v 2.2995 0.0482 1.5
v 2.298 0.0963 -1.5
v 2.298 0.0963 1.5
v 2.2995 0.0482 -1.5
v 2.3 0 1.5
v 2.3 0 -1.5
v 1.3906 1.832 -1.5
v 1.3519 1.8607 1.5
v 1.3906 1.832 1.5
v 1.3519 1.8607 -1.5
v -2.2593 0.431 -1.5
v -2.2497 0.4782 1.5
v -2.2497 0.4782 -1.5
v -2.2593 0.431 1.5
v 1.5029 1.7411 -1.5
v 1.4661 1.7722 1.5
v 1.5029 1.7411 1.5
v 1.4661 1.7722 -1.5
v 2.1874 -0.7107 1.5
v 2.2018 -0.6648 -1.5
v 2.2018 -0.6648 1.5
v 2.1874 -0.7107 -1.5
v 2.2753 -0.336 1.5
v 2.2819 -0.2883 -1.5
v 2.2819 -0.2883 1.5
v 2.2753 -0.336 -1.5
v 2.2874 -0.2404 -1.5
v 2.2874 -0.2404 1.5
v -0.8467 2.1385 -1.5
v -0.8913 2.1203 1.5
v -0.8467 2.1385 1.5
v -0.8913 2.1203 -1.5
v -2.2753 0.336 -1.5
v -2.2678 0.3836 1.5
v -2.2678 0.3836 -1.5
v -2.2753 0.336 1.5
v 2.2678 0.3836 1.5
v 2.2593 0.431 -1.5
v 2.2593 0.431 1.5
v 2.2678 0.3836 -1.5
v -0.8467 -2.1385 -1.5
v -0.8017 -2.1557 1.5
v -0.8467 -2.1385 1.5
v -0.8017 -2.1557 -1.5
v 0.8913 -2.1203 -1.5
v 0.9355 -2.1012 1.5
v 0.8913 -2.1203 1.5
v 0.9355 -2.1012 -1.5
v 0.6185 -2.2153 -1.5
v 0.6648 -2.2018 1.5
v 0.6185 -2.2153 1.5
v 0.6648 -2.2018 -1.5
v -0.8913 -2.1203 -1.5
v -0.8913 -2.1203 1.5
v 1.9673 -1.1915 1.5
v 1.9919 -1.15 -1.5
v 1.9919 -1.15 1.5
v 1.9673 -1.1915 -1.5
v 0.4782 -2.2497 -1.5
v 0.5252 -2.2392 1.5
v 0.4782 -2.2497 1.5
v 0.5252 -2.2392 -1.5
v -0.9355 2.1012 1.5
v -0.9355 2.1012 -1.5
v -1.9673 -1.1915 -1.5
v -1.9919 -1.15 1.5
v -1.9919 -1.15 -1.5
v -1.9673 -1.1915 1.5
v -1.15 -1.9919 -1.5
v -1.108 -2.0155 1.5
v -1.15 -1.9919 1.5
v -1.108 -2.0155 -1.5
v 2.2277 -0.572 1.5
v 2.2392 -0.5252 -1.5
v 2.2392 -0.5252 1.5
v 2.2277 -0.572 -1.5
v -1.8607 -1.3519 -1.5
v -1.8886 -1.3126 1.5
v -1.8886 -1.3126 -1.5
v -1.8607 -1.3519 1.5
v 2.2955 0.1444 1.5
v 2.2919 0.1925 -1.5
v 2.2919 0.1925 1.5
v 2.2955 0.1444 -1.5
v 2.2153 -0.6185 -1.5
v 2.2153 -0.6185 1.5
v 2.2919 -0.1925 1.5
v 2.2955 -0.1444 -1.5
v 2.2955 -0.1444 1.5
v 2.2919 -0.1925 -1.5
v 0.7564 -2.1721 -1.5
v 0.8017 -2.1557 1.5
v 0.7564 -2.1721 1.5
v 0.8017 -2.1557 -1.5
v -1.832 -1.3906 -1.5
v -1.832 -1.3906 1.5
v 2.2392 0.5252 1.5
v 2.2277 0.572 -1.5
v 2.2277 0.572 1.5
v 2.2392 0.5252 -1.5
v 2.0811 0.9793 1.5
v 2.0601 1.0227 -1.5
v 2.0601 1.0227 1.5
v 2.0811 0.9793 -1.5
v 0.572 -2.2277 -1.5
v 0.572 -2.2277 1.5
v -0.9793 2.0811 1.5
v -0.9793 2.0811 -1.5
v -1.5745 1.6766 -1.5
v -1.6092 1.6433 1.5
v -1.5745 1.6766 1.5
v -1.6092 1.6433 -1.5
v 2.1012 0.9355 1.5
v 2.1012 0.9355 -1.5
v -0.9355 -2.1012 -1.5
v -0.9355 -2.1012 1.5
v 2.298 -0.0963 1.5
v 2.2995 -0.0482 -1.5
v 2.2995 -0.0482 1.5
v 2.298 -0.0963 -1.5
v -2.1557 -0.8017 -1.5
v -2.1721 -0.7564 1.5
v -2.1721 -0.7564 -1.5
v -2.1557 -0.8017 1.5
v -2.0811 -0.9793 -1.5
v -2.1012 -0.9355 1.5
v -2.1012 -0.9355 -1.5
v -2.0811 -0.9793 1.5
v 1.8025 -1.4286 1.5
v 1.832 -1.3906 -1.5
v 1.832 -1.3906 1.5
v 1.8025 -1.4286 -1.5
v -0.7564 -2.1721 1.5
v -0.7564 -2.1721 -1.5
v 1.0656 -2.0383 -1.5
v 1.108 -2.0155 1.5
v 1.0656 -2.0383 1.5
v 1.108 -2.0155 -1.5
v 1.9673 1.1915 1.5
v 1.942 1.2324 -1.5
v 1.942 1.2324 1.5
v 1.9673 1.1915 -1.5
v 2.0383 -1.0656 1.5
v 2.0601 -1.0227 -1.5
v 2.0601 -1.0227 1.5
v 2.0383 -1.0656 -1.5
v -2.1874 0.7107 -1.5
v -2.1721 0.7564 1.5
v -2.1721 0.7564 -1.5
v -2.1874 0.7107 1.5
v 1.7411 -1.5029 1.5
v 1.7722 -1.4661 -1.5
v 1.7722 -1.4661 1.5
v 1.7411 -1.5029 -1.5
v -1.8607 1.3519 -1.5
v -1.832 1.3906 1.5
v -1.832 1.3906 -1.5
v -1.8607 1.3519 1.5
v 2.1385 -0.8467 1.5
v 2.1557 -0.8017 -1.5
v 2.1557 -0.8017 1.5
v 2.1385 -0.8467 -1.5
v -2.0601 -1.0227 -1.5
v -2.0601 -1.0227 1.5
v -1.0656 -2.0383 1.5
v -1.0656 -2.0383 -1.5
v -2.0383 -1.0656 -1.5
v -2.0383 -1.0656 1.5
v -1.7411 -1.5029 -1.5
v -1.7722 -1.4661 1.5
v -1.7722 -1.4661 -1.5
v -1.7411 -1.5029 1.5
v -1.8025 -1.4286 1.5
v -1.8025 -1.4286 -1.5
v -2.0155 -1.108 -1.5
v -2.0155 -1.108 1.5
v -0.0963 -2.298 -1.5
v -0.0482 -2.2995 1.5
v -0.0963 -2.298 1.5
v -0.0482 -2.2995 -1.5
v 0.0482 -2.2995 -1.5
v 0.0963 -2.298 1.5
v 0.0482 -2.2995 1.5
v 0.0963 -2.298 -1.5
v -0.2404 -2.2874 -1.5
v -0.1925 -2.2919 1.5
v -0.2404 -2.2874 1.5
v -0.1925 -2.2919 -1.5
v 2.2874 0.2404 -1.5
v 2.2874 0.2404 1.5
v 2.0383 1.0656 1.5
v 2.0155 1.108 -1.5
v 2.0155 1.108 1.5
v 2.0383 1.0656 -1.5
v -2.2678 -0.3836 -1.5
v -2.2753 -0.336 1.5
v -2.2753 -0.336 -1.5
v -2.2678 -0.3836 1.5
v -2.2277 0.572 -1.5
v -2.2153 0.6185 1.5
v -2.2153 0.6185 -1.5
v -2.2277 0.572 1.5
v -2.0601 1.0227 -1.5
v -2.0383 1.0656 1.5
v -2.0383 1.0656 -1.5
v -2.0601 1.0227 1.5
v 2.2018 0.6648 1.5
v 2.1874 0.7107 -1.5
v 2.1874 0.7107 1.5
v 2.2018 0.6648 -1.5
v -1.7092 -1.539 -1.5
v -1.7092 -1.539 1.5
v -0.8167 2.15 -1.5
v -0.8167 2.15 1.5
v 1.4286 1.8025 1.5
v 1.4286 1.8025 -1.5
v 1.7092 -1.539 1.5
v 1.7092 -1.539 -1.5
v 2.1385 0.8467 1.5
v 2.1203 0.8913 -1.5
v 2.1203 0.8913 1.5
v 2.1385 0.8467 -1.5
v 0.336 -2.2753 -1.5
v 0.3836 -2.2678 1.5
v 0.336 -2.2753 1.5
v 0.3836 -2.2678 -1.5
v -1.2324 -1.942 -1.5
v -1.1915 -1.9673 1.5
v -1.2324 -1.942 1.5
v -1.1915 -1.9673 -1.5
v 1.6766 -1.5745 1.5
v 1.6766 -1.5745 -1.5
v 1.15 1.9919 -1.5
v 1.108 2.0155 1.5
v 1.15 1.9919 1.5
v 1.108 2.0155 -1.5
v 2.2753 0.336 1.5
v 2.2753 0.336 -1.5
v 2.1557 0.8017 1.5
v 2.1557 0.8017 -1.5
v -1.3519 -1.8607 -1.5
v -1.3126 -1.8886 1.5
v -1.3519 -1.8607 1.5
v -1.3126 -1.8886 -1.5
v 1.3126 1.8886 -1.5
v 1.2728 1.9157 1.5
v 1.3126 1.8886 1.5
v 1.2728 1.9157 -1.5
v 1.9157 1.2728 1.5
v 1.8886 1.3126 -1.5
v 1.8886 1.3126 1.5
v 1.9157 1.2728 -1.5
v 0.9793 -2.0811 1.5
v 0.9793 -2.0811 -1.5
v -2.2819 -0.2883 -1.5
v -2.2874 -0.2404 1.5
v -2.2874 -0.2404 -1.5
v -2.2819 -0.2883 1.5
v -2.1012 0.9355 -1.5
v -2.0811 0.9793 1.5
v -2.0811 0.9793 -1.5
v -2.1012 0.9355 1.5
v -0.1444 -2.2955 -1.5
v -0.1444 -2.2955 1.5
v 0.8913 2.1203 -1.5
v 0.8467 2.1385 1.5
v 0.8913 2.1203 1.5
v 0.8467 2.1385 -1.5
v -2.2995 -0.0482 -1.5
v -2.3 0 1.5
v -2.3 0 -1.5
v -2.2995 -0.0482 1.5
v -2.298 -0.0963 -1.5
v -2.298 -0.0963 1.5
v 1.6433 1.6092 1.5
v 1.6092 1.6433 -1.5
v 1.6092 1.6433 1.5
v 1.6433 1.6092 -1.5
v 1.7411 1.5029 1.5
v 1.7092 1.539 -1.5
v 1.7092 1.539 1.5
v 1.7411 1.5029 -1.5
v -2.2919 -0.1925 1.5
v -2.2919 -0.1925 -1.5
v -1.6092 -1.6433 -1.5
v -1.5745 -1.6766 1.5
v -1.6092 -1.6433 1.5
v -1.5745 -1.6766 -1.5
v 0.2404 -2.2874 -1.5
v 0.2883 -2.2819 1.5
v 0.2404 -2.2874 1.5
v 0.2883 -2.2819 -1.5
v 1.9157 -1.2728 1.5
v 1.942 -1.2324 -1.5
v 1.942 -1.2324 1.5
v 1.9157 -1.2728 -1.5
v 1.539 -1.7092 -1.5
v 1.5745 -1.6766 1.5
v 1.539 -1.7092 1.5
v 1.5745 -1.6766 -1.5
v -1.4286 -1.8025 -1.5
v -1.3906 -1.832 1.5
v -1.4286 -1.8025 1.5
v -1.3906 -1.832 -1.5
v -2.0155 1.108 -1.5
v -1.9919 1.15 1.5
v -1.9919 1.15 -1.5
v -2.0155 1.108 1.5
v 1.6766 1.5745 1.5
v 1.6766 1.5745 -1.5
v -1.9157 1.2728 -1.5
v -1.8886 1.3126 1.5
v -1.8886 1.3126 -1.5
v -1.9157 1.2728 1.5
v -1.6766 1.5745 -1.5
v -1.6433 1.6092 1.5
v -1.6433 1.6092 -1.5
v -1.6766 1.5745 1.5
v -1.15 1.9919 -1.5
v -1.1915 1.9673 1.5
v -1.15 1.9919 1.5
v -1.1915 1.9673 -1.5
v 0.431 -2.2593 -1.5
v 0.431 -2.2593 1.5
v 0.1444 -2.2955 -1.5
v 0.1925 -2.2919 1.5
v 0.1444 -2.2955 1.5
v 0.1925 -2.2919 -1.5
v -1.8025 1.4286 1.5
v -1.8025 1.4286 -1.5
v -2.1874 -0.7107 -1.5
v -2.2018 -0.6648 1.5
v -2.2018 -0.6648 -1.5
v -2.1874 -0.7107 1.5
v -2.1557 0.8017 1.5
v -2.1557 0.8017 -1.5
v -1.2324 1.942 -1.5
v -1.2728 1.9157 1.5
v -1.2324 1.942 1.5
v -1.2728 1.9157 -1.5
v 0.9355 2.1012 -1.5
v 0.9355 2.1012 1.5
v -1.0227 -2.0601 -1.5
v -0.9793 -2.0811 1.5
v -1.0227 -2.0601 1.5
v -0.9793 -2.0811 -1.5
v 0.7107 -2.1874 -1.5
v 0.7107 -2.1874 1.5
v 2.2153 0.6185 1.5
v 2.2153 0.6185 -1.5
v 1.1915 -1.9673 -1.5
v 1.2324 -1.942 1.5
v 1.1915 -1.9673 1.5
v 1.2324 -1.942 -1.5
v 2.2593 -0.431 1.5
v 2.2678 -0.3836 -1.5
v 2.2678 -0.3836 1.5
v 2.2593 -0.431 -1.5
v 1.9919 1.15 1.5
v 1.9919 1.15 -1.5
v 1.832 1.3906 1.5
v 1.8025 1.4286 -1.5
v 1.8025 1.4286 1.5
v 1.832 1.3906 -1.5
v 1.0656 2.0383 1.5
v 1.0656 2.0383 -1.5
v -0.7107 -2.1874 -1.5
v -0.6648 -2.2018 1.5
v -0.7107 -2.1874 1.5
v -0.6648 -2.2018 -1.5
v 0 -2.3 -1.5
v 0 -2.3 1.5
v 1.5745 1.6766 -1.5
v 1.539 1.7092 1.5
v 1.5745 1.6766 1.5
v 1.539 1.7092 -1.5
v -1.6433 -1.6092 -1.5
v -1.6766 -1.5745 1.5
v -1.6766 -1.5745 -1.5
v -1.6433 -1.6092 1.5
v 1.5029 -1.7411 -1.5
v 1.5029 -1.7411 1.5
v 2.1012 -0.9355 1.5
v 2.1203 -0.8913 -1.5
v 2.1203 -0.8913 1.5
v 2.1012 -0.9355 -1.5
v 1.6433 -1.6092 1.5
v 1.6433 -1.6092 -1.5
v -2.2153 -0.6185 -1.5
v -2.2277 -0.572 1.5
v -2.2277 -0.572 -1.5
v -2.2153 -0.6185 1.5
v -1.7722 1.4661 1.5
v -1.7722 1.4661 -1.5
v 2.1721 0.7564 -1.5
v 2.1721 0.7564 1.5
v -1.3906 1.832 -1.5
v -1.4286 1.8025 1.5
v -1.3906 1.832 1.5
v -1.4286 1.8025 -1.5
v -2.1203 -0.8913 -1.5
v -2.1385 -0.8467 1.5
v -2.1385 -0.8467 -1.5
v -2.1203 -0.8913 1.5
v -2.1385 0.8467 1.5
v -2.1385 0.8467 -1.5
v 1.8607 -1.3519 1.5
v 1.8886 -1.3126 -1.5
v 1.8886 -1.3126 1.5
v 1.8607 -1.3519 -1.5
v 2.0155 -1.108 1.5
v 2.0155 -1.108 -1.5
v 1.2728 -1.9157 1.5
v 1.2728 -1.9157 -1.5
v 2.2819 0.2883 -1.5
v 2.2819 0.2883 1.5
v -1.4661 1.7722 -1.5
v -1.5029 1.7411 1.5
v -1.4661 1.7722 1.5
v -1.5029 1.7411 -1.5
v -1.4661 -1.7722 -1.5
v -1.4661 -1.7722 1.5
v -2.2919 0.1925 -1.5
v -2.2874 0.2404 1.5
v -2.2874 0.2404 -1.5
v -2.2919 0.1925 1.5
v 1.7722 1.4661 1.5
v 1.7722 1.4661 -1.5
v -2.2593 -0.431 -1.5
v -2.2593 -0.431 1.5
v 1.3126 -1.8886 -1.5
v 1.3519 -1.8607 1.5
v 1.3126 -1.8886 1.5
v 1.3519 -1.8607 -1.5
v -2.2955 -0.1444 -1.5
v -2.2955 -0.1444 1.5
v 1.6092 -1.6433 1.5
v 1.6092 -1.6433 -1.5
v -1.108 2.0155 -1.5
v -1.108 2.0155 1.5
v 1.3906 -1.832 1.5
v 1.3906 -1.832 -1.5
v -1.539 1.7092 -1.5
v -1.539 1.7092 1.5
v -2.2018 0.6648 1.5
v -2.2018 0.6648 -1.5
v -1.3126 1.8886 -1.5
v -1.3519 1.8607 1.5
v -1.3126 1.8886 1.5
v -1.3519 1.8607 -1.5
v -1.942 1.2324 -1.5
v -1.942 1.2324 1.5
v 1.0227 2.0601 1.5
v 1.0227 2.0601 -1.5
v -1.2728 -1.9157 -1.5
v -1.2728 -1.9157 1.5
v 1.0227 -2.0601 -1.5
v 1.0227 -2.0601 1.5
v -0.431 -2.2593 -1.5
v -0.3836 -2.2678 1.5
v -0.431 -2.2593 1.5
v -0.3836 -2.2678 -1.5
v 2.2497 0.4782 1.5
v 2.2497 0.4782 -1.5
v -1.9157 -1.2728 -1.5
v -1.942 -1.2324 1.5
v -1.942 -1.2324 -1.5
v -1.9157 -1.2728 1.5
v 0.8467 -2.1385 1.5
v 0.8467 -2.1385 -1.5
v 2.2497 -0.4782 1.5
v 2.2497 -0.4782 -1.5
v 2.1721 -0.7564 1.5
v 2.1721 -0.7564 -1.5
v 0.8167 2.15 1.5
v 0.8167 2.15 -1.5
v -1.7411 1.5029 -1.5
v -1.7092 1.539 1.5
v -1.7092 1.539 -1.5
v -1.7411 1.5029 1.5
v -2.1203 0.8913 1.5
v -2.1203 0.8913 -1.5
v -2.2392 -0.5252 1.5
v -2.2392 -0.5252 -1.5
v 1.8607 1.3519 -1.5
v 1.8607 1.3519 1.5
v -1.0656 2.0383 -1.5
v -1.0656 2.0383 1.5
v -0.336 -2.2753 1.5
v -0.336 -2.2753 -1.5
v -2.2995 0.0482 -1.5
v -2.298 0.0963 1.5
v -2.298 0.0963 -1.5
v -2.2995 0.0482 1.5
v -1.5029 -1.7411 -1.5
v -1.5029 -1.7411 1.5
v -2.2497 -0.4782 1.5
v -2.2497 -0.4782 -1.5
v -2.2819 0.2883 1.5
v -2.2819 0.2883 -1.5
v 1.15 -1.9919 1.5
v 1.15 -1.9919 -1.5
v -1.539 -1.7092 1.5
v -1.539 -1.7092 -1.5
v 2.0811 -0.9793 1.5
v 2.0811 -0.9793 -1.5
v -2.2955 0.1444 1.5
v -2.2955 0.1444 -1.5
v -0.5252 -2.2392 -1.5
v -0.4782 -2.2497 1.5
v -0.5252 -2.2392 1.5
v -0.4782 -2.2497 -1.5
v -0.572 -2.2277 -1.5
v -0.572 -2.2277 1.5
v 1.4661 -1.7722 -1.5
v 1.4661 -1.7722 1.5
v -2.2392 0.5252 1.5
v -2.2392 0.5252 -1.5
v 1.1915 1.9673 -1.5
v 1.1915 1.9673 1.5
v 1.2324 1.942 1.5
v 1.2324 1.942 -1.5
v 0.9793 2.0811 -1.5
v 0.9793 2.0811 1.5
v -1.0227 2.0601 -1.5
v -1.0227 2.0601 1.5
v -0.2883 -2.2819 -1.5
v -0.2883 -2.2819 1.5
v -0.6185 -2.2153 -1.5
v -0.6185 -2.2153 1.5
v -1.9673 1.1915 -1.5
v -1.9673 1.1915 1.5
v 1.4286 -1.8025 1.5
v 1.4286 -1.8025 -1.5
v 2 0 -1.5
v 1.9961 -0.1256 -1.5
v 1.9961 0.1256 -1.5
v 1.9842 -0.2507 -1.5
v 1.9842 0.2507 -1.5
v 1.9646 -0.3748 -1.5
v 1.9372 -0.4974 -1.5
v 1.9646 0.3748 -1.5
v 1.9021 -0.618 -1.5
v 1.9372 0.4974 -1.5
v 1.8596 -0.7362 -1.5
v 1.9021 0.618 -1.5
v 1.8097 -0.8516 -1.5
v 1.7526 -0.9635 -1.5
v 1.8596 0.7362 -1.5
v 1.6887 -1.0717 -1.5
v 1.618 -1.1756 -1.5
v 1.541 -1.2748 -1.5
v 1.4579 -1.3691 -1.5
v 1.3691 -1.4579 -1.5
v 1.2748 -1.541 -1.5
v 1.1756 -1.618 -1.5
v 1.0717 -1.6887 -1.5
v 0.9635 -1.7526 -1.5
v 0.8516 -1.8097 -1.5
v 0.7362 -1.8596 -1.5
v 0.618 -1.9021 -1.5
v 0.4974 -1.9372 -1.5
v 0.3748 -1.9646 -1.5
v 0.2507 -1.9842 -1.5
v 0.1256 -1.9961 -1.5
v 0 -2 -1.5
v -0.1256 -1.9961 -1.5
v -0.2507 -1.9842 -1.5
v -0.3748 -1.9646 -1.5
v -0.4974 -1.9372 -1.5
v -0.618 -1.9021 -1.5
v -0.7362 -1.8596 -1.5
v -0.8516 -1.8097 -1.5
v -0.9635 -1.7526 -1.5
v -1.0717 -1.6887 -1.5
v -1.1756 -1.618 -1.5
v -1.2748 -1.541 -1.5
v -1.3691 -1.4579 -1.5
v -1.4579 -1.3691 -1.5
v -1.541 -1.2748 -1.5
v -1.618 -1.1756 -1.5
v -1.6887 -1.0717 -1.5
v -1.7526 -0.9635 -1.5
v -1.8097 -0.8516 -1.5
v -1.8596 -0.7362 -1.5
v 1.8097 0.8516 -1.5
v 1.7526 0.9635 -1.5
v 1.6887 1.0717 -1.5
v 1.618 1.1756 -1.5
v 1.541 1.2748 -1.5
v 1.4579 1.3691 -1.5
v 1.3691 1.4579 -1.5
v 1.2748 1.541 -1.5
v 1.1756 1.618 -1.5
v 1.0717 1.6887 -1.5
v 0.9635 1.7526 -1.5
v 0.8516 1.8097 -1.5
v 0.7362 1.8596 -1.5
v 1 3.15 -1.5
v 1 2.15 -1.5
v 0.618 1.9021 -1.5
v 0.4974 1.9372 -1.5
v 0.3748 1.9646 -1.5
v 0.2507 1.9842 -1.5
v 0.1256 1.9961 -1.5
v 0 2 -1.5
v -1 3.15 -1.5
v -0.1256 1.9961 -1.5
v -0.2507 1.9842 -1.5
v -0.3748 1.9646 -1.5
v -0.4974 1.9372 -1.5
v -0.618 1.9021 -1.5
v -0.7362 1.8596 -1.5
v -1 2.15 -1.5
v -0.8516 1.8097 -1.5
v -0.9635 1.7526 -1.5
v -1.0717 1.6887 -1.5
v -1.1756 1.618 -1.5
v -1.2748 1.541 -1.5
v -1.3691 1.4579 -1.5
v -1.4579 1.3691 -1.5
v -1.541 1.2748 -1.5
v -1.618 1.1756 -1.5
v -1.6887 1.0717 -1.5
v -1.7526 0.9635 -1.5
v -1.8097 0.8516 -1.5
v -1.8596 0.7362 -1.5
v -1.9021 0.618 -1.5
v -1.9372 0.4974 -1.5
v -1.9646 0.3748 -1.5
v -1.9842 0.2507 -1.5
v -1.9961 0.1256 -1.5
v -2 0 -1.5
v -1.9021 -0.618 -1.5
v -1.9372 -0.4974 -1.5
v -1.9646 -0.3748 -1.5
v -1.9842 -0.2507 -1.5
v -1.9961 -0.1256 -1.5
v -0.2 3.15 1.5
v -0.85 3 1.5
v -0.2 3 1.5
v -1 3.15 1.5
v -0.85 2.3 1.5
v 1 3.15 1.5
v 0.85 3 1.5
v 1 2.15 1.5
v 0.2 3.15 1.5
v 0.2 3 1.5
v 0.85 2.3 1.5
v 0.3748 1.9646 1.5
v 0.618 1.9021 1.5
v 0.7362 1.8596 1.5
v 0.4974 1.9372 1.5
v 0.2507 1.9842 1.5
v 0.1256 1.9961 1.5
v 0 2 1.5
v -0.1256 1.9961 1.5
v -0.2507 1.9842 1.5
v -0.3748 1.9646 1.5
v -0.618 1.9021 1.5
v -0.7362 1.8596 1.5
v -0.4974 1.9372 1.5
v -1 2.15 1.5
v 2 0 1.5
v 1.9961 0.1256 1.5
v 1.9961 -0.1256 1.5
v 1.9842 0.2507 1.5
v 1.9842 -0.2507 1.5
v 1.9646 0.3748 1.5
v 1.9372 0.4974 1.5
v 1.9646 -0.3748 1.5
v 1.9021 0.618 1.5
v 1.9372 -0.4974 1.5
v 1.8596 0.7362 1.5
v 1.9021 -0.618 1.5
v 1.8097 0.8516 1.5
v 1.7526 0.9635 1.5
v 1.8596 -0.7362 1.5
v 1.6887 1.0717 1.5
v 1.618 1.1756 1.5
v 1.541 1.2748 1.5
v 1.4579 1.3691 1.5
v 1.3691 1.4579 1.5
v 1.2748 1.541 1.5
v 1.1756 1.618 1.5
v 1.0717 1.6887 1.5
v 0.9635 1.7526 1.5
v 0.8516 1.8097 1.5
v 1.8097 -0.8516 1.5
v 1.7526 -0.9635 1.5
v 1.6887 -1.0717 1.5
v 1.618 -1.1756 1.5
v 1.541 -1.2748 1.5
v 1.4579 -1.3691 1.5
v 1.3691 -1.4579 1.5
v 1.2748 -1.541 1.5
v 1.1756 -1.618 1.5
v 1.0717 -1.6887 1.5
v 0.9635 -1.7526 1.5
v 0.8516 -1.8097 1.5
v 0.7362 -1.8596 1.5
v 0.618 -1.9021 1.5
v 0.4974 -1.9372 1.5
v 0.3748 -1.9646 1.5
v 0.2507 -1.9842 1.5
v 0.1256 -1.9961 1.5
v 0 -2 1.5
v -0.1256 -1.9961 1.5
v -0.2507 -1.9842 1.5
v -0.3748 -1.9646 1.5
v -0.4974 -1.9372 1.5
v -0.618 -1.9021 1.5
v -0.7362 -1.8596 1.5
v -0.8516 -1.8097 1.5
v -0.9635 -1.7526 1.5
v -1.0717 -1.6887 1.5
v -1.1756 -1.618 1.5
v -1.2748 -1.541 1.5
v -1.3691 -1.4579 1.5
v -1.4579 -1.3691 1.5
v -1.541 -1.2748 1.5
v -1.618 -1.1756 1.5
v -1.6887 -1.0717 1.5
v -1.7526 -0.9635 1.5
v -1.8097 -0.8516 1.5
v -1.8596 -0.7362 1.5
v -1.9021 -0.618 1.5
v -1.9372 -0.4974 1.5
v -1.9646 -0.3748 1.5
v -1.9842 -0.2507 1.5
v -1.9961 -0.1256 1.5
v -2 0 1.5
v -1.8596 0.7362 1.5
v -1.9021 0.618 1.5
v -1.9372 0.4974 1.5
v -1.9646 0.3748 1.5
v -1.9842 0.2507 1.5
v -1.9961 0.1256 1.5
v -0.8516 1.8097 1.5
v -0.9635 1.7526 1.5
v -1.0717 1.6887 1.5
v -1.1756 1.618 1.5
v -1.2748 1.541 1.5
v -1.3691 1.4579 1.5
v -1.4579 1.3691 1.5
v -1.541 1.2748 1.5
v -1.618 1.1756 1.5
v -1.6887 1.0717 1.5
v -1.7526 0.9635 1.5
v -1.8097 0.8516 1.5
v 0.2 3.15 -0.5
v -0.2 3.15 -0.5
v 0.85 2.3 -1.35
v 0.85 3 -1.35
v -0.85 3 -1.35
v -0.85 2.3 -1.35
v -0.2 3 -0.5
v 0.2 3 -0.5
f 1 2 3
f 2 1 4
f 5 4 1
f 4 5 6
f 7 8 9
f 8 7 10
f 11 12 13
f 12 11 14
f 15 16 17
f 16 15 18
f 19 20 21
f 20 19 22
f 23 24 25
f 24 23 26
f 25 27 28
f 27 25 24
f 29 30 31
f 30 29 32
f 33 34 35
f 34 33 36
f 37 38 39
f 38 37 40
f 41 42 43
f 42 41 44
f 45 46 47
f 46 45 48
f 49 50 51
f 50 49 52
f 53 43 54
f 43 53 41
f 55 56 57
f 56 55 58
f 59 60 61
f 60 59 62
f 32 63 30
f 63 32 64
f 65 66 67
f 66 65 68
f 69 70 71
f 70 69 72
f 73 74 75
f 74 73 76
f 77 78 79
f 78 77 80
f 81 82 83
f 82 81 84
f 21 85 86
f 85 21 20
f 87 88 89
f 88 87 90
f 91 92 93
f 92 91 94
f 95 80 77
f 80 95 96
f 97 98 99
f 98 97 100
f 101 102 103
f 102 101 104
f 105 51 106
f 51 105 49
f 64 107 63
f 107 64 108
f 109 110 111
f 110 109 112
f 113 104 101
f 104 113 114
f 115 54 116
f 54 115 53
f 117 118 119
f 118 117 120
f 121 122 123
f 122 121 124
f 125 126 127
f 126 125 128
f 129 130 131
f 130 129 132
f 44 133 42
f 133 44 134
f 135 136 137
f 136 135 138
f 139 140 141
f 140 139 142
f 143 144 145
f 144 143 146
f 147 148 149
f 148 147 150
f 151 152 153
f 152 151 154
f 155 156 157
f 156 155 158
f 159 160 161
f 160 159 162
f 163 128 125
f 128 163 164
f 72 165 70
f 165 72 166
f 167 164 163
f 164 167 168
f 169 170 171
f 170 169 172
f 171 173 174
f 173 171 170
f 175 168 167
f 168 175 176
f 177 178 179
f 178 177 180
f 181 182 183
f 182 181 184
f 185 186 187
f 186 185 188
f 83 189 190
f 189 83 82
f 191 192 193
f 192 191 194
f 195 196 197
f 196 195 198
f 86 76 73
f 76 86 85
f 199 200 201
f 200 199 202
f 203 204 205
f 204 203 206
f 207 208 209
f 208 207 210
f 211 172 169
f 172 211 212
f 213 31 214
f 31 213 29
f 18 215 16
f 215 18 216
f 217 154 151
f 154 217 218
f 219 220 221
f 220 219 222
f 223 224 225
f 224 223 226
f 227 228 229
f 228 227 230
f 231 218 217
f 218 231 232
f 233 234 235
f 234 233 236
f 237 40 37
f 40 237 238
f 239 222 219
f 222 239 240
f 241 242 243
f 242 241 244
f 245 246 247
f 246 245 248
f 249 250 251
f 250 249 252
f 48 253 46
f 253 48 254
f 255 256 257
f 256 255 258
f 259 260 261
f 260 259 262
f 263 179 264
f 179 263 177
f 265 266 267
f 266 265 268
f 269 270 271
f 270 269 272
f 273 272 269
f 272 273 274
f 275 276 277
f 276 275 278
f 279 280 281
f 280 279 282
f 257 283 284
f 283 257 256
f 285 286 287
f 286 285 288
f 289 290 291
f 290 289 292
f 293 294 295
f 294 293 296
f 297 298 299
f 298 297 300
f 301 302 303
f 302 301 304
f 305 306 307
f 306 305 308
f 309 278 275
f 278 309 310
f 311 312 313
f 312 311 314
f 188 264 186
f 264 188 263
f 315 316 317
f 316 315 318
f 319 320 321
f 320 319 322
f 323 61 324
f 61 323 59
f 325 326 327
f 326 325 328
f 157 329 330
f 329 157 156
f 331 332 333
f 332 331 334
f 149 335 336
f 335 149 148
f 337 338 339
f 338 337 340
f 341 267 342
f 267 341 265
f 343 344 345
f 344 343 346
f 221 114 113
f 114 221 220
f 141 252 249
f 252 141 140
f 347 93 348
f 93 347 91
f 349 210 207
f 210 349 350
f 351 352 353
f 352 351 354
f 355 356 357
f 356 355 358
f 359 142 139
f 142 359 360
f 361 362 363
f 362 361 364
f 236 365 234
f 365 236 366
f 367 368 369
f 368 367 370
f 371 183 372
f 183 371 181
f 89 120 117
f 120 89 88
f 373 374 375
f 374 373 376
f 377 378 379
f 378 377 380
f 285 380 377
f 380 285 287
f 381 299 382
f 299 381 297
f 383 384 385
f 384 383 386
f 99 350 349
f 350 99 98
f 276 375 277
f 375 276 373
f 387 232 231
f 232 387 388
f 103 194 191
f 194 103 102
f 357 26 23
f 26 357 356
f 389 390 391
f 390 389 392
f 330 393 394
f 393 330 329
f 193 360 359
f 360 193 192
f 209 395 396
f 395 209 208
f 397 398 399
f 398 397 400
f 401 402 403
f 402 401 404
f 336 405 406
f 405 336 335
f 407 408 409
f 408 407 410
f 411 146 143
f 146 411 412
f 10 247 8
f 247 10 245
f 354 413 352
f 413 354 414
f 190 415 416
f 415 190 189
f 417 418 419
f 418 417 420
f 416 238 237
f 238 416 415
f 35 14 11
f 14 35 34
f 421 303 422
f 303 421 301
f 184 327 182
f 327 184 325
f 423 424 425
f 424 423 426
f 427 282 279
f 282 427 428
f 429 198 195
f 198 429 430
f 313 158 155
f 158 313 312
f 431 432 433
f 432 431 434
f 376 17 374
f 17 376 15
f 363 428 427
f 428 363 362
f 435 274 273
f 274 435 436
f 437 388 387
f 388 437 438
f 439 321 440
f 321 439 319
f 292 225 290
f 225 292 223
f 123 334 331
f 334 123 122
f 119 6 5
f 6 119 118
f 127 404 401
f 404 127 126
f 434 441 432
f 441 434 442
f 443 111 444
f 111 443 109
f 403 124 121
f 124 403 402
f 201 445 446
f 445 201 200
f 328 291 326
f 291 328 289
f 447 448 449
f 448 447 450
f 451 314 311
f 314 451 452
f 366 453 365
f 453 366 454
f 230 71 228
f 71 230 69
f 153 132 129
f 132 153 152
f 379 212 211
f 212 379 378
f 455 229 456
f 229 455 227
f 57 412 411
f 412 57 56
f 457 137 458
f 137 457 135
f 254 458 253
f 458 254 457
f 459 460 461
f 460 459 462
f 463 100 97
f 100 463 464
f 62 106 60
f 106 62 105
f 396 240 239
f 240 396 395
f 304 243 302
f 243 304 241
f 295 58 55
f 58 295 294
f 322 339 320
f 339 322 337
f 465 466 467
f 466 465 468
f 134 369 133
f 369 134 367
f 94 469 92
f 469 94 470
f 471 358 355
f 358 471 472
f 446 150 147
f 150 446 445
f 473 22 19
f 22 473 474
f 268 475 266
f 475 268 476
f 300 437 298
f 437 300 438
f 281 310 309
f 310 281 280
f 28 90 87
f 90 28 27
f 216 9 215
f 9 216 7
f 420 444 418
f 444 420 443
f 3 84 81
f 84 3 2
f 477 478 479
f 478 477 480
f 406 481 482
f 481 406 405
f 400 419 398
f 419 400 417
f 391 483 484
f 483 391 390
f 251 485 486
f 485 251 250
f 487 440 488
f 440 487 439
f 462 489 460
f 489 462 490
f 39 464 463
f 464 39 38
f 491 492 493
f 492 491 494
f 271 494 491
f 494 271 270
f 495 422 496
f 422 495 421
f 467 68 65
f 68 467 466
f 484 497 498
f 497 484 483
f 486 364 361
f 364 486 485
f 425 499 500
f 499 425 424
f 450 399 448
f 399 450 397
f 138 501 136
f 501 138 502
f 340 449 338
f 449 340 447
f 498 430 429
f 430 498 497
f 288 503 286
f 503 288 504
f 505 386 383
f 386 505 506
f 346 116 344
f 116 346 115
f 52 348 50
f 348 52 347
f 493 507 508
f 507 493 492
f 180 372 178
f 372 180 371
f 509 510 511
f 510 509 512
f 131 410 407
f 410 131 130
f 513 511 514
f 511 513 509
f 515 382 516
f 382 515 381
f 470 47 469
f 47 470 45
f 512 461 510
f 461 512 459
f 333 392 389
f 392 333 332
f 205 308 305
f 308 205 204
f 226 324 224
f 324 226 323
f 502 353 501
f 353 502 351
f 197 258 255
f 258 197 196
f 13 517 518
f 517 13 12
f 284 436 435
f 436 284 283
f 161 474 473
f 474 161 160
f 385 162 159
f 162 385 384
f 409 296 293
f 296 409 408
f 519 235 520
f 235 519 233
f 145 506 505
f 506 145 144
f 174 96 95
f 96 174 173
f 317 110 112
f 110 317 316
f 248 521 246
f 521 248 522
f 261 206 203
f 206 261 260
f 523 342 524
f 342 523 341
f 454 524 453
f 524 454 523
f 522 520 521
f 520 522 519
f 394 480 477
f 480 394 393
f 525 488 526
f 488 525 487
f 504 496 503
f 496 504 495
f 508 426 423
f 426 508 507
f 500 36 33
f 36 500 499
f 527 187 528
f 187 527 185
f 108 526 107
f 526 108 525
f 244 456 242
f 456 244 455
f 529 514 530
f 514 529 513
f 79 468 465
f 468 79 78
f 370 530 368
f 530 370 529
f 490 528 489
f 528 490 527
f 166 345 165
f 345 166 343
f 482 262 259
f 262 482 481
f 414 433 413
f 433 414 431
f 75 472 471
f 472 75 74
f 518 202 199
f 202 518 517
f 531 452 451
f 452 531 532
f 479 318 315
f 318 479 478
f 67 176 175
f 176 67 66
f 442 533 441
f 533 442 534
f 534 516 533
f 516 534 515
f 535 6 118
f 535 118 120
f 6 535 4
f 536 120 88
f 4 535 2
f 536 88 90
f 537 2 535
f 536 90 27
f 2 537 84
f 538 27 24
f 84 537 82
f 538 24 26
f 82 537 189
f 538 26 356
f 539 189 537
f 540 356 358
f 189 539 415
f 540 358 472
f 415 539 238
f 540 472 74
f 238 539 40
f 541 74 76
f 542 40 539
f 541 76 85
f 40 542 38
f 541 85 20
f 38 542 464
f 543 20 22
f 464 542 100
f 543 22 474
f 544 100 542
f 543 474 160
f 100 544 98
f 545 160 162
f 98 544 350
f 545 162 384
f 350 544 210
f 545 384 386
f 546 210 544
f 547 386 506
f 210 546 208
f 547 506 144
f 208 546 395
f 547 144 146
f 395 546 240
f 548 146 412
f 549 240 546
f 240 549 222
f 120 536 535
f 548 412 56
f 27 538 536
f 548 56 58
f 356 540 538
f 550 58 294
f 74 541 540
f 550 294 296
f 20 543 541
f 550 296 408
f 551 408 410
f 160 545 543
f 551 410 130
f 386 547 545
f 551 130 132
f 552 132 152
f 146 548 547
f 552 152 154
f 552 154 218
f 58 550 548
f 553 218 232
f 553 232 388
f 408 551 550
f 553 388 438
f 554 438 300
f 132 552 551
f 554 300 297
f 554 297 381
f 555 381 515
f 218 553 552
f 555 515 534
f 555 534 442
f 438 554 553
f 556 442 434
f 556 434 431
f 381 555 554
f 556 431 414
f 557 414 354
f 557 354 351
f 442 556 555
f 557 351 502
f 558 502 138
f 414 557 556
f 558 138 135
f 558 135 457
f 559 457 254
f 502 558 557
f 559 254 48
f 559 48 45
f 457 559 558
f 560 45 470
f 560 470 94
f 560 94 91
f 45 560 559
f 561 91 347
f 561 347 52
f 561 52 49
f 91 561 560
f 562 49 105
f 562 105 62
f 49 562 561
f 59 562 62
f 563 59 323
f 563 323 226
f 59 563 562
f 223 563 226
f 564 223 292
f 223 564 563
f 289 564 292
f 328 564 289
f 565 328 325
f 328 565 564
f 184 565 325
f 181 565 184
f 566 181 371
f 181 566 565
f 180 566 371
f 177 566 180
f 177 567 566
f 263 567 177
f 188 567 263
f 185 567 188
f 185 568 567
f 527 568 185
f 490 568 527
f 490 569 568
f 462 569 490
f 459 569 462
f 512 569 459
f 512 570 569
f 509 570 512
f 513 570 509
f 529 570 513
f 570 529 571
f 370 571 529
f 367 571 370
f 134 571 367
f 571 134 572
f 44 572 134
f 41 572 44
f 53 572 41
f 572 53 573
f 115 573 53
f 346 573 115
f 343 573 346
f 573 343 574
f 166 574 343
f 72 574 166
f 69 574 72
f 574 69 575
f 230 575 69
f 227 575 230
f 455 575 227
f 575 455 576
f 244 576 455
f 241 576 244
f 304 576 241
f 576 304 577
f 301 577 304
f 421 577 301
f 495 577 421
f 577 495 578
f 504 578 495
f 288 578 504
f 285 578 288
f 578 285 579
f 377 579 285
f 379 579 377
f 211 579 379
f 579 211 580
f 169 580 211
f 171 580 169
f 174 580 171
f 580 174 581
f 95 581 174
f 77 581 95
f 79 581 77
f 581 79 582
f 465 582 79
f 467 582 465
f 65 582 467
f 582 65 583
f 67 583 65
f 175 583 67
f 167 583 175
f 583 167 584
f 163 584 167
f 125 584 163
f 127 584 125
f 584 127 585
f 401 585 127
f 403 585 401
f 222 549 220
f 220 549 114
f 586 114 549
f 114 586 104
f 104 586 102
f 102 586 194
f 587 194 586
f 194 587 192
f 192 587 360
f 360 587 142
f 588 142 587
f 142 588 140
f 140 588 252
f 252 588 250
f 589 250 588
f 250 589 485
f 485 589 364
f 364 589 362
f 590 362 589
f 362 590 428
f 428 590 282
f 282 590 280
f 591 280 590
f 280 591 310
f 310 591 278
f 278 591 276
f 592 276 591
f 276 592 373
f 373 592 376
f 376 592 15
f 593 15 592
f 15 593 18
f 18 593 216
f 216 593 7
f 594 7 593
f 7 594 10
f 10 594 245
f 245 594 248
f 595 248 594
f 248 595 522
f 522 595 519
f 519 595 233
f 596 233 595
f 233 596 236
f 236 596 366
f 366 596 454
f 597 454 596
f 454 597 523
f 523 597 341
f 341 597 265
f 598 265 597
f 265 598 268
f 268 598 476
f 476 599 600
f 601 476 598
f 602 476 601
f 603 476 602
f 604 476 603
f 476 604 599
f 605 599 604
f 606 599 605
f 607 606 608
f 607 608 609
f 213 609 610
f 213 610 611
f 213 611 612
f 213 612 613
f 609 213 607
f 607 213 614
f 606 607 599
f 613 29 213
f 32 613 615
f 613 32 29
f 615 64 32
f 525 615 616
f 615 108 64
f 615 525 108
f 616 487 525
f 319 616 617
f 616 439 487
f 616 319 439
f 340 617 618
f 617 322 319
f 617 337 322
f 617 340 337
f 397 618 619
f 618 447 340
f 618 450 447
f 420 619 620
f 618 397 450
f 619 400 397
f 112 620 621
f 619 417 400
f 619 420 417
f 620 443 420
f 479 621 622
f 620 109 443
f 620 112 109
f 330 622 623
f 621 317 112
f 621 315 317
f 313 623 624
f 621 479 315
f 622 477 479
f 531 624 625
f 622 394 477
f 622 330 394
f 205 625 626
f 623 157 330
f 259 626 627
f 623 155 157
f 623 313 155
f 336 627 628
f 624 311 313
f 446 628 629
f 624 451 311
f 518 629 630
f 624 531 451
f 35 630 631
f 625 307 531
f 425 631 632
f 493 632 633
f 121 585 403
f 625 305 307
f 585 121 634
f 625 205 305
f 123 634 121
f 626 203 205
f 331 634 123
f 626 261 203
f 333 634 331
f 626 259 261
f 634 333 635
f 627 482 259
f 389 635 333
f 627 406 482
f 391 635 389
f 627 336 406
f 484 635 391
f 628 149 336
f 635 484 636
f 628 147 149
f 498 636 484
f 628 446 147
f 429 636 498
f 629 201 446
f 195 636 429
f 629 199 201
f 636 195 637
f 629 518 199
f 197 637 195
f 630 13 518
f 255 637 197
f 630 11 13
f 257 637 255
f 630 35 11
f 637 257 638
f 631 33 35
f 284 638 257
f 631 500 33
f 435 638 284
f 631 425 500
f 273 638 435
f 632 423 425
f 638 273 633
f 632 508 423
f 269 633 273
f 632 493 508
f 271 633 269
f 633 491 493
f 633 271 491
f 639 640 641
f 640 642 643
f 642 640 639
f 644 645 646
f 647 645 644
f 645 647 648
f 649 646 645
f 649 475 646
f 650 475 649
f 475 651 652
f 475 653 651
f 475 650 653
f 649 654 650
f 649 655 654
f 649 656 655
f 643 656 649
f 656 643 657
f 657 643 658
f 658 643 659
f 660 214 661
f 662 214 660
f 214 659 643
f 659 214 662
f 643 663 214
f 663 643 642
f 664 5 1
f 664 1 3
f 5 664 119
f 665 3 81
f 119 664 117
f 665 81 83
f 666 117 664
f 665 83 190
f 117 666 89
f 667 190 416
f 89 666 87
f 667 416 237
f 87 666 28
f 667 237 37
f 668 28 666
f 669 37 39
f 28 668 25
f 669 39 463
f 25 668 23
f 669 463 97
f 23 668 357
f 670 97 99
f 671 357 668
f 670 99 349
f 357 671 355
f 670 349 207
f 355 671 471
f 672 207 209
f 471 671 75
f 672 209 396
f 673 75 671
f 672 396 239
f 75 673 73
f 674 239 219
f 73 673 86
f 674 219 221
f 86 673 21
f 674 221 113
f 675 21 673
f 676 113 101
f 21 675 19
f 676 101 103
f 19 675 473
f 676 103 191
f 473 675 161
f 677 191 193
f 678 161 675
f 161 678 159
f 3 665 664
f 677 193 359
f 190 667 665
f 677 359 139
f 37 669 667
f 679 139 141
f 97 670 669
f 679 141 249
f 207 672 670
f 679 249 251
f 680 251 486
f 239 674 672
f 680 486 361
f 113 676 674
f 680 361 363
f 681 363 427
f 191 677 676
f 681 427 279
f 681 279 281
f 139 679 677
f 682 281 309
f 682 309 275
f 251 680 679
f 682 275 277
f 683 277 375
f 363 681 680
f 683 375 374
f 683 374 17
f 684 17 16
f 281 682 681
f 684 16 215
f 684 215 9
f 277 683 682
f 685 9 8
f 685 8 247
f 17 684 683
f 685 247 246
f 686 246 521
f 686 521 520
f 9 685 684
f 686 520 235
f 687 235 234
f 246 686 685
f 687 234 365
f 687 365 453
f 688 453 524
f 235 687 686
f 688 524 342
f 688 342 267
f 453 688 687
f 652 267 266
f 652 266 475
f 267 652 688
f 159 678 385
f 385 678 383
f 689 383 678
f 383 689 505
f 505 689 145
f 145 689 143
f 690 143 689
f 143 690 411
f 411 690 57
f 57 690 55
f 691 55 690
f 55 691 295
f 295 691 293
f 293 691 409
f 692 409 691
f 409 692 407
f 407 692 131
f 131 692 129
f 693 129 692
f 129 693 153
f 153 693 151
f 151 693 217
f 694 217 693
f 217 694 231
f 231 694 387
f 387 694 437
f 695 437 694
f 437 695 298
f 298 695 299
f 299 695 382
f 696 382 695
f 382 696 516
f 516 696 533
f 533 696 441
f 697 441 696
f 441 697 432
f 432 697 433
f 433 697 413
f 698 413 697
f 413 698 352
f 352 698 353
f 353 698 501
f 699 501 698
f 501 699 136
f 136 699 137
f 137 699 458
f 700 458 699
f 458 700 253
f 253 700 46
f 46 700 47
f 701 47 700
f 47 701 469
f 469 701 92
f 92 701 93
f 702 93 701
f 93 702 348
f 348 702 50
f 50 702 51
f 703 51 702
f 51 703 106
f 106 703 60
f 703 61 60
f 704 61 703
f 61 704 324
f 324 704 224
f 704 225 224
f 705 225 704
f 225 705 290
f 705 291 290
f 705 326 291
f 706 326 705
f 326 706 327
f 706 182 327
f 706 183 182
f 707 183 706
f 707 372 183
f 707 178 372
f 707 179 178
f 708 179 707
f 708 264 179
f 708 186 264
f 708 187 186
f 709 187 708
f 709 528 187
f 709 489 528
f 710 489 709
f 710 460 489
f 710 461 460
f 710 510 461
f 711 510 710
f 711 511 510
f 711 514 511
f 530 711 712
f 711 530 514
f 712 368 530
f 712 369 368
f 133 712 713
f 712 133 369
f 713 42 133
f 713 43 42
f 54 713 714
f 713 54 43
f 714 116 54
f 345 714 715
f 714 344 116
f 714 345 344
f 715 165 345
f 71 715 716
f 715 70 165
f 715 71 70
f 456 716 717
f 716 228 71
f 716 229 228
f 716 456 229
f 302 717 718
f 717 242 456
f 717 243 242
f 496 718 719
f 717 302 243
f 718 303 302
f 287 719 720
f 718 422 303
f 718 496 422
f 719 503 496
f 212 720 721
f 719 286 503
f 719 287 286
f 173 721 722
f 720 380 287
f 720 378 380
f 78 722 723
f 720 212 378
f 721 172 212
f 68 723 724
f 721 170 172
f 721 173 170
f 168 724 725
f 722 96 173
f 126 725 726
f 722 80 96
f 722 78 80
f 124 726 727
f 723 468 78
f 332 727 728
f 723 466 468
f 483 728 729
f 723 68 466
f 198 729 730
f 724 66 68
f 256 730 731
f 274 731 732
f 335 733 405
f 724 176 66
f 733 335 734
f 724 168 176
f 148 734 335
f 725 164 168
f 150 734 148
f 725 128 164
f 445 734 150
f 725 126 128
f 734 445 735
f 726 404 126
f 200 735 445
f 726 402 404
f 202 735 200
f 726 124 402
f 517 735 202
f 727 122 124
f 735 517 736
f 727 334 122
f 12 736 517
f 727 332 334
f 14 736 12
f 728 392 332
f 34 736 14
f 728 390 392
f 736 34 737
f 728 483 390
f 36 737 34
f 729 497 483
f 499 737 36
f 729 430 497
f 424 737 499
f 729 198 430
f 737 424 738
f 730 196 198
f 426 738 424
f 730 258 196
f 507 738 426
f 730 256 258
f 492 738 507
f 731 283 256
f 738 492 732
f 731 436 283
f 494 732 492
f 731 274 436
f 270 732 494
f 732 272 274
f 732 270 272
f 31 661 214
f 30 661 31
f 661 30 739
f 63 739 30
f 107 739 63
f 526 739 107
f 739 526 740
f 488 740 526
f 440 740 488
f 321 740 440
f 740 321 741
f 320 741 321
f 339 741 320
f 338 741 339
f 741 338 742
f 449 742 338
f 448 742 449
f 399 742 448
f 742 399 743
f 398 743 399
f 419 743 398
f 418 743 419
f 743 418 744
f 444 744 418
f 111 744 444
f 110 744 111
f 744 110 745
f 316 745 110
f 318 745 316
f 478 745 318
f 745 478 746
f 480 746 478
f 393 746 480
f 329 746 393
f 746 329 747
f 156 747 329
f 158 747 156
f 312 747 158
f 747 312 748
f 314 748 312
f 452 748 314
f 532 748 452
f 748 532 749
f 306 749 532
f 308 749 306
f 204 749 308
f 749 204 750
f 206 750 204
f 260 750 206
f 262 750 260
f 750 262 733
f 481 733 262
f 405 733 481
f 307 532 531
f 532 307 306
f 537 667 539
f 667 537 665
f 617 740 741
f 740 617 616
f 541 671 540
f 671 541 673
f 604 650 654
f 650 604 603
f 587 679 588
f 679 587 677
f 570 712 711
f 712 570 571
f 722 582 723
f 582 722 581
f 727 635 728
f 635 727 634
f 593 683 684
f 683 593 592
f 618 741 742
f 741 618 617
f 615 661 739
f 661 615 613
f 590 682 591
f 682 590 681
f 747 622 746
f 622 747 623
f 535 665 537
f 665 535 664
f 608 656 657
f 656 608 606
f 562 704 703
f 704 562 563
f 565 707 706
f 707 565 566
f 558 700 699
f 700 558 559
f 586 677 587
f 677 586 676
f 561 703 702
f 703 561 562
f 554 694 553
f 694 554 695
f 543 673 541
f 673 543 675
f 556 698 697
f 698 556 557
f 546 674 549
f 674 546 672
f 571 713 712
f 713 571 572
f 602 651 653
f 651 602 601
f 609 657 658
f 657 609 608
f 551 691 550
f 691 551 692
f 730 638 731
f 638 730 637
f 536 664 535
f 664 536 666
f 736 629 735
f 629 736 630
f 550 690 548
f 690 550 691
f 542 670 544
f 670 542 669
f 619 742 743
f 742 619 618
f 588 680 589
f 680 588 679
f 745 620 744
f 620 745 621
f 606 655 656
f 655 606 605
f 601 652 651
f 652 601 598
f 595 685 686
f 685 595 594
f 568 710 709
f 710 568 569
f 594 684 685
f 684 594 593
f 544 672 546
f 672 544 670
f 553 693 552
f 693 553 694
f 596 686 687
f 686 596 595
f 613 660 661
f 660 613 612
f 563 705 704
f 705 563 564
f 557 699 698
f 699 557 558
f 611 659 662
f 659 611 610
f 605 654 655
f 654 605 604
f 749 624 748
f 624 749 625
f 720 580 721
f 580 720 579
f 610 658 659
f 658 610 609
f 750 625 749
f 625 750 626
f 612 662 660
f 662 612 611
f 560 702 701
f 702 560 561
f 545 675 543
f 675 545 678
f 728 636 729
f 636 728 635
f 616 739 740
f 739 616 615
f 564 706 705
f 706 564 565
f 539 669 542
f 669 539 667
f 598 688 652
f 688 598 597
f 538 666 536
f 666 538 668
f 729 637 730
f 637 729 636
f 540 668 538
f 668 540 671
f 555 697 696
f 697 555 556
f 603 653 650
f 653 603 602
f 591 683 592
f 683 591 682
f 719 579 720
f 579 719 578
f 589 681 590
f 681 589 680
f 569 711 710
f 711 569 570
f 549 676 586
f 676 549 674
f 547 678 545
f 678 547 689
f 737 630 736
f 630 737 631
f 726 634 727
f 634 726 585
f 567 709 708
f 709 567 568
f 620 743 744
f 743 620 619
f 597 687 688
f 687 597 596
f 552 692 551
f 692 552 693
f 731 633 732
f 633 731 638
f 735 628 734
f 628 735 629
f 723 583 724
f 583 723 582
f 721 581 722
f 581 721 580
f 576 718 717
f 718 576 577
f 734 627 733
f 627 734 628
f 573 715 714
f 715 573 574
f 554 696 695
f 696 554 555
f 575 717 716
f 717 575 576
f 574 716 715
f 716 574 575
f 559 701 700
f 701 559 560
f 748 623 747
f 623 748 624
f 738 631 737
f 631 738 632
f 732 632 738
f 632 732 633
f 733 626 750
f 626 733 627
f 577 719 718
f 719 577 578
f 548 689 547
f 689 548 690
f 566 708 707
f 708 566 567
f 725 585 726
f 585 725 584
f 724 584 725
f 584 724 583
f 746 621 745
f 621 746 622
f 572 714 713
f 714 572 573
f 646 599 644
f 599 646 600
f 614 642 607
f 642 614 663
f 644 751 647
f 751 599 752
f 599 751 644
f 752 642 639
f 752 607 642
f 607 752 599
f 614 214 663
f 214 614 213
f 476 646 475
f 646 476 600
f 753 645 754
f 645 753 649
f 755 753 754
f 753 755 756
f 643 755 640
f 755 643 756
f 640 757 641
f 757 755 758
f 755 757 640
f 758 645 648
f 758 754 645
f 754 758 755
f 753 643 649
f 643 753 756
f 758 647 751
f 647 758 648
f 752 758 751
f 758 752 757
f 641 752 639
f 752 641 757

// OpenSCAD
// strap
interior=2;
thickness=.3;
exterior=interior+thickness;
height=3;
// pocket
pocket_exterior_width=2;
pocket_exterior_depth=1;
pocket_height=height;
pocket_thickness=.15;
pocket_inner_width=pocket_exterior_width - 2 * pocket_thickness;
pocket_inner_depth=pocket_exterior_depth - 2 * pocket_thickness;
pocket_inner_height = 200; // it's for exlusion, so okay to make large
pocket_cut_width=.4;
pocket_cut_floor=1;

difference() {
	cylinder (h = height, r=exterior, center = true, $fn=300);
	cylinder (h = height + 1, r = interior, center = true, $fn=100);
}

translate([-pocket_exterior_width/2, exterior-pocket_thickness, -pocket_height/2]) {
    difference() {
        cube([pocket_exterior_width, pocket_exterior_depth, pocket_height], $fn=300);
        translate([pocket_thickness, pocket_thickness, pocket_thickness]) {
            cube([pocket_inner_width, pocket_inner_depth, pocket_inner_height]);
        }
        translate([pocket_exterior_width / 2 - pocket_cut_width/2, pocket_thickness, pocket_cut_floor]) {
            cube([pocket_cut_width, pocket_inner_height, pocket_inner_height]);
        }
    }
    
}
